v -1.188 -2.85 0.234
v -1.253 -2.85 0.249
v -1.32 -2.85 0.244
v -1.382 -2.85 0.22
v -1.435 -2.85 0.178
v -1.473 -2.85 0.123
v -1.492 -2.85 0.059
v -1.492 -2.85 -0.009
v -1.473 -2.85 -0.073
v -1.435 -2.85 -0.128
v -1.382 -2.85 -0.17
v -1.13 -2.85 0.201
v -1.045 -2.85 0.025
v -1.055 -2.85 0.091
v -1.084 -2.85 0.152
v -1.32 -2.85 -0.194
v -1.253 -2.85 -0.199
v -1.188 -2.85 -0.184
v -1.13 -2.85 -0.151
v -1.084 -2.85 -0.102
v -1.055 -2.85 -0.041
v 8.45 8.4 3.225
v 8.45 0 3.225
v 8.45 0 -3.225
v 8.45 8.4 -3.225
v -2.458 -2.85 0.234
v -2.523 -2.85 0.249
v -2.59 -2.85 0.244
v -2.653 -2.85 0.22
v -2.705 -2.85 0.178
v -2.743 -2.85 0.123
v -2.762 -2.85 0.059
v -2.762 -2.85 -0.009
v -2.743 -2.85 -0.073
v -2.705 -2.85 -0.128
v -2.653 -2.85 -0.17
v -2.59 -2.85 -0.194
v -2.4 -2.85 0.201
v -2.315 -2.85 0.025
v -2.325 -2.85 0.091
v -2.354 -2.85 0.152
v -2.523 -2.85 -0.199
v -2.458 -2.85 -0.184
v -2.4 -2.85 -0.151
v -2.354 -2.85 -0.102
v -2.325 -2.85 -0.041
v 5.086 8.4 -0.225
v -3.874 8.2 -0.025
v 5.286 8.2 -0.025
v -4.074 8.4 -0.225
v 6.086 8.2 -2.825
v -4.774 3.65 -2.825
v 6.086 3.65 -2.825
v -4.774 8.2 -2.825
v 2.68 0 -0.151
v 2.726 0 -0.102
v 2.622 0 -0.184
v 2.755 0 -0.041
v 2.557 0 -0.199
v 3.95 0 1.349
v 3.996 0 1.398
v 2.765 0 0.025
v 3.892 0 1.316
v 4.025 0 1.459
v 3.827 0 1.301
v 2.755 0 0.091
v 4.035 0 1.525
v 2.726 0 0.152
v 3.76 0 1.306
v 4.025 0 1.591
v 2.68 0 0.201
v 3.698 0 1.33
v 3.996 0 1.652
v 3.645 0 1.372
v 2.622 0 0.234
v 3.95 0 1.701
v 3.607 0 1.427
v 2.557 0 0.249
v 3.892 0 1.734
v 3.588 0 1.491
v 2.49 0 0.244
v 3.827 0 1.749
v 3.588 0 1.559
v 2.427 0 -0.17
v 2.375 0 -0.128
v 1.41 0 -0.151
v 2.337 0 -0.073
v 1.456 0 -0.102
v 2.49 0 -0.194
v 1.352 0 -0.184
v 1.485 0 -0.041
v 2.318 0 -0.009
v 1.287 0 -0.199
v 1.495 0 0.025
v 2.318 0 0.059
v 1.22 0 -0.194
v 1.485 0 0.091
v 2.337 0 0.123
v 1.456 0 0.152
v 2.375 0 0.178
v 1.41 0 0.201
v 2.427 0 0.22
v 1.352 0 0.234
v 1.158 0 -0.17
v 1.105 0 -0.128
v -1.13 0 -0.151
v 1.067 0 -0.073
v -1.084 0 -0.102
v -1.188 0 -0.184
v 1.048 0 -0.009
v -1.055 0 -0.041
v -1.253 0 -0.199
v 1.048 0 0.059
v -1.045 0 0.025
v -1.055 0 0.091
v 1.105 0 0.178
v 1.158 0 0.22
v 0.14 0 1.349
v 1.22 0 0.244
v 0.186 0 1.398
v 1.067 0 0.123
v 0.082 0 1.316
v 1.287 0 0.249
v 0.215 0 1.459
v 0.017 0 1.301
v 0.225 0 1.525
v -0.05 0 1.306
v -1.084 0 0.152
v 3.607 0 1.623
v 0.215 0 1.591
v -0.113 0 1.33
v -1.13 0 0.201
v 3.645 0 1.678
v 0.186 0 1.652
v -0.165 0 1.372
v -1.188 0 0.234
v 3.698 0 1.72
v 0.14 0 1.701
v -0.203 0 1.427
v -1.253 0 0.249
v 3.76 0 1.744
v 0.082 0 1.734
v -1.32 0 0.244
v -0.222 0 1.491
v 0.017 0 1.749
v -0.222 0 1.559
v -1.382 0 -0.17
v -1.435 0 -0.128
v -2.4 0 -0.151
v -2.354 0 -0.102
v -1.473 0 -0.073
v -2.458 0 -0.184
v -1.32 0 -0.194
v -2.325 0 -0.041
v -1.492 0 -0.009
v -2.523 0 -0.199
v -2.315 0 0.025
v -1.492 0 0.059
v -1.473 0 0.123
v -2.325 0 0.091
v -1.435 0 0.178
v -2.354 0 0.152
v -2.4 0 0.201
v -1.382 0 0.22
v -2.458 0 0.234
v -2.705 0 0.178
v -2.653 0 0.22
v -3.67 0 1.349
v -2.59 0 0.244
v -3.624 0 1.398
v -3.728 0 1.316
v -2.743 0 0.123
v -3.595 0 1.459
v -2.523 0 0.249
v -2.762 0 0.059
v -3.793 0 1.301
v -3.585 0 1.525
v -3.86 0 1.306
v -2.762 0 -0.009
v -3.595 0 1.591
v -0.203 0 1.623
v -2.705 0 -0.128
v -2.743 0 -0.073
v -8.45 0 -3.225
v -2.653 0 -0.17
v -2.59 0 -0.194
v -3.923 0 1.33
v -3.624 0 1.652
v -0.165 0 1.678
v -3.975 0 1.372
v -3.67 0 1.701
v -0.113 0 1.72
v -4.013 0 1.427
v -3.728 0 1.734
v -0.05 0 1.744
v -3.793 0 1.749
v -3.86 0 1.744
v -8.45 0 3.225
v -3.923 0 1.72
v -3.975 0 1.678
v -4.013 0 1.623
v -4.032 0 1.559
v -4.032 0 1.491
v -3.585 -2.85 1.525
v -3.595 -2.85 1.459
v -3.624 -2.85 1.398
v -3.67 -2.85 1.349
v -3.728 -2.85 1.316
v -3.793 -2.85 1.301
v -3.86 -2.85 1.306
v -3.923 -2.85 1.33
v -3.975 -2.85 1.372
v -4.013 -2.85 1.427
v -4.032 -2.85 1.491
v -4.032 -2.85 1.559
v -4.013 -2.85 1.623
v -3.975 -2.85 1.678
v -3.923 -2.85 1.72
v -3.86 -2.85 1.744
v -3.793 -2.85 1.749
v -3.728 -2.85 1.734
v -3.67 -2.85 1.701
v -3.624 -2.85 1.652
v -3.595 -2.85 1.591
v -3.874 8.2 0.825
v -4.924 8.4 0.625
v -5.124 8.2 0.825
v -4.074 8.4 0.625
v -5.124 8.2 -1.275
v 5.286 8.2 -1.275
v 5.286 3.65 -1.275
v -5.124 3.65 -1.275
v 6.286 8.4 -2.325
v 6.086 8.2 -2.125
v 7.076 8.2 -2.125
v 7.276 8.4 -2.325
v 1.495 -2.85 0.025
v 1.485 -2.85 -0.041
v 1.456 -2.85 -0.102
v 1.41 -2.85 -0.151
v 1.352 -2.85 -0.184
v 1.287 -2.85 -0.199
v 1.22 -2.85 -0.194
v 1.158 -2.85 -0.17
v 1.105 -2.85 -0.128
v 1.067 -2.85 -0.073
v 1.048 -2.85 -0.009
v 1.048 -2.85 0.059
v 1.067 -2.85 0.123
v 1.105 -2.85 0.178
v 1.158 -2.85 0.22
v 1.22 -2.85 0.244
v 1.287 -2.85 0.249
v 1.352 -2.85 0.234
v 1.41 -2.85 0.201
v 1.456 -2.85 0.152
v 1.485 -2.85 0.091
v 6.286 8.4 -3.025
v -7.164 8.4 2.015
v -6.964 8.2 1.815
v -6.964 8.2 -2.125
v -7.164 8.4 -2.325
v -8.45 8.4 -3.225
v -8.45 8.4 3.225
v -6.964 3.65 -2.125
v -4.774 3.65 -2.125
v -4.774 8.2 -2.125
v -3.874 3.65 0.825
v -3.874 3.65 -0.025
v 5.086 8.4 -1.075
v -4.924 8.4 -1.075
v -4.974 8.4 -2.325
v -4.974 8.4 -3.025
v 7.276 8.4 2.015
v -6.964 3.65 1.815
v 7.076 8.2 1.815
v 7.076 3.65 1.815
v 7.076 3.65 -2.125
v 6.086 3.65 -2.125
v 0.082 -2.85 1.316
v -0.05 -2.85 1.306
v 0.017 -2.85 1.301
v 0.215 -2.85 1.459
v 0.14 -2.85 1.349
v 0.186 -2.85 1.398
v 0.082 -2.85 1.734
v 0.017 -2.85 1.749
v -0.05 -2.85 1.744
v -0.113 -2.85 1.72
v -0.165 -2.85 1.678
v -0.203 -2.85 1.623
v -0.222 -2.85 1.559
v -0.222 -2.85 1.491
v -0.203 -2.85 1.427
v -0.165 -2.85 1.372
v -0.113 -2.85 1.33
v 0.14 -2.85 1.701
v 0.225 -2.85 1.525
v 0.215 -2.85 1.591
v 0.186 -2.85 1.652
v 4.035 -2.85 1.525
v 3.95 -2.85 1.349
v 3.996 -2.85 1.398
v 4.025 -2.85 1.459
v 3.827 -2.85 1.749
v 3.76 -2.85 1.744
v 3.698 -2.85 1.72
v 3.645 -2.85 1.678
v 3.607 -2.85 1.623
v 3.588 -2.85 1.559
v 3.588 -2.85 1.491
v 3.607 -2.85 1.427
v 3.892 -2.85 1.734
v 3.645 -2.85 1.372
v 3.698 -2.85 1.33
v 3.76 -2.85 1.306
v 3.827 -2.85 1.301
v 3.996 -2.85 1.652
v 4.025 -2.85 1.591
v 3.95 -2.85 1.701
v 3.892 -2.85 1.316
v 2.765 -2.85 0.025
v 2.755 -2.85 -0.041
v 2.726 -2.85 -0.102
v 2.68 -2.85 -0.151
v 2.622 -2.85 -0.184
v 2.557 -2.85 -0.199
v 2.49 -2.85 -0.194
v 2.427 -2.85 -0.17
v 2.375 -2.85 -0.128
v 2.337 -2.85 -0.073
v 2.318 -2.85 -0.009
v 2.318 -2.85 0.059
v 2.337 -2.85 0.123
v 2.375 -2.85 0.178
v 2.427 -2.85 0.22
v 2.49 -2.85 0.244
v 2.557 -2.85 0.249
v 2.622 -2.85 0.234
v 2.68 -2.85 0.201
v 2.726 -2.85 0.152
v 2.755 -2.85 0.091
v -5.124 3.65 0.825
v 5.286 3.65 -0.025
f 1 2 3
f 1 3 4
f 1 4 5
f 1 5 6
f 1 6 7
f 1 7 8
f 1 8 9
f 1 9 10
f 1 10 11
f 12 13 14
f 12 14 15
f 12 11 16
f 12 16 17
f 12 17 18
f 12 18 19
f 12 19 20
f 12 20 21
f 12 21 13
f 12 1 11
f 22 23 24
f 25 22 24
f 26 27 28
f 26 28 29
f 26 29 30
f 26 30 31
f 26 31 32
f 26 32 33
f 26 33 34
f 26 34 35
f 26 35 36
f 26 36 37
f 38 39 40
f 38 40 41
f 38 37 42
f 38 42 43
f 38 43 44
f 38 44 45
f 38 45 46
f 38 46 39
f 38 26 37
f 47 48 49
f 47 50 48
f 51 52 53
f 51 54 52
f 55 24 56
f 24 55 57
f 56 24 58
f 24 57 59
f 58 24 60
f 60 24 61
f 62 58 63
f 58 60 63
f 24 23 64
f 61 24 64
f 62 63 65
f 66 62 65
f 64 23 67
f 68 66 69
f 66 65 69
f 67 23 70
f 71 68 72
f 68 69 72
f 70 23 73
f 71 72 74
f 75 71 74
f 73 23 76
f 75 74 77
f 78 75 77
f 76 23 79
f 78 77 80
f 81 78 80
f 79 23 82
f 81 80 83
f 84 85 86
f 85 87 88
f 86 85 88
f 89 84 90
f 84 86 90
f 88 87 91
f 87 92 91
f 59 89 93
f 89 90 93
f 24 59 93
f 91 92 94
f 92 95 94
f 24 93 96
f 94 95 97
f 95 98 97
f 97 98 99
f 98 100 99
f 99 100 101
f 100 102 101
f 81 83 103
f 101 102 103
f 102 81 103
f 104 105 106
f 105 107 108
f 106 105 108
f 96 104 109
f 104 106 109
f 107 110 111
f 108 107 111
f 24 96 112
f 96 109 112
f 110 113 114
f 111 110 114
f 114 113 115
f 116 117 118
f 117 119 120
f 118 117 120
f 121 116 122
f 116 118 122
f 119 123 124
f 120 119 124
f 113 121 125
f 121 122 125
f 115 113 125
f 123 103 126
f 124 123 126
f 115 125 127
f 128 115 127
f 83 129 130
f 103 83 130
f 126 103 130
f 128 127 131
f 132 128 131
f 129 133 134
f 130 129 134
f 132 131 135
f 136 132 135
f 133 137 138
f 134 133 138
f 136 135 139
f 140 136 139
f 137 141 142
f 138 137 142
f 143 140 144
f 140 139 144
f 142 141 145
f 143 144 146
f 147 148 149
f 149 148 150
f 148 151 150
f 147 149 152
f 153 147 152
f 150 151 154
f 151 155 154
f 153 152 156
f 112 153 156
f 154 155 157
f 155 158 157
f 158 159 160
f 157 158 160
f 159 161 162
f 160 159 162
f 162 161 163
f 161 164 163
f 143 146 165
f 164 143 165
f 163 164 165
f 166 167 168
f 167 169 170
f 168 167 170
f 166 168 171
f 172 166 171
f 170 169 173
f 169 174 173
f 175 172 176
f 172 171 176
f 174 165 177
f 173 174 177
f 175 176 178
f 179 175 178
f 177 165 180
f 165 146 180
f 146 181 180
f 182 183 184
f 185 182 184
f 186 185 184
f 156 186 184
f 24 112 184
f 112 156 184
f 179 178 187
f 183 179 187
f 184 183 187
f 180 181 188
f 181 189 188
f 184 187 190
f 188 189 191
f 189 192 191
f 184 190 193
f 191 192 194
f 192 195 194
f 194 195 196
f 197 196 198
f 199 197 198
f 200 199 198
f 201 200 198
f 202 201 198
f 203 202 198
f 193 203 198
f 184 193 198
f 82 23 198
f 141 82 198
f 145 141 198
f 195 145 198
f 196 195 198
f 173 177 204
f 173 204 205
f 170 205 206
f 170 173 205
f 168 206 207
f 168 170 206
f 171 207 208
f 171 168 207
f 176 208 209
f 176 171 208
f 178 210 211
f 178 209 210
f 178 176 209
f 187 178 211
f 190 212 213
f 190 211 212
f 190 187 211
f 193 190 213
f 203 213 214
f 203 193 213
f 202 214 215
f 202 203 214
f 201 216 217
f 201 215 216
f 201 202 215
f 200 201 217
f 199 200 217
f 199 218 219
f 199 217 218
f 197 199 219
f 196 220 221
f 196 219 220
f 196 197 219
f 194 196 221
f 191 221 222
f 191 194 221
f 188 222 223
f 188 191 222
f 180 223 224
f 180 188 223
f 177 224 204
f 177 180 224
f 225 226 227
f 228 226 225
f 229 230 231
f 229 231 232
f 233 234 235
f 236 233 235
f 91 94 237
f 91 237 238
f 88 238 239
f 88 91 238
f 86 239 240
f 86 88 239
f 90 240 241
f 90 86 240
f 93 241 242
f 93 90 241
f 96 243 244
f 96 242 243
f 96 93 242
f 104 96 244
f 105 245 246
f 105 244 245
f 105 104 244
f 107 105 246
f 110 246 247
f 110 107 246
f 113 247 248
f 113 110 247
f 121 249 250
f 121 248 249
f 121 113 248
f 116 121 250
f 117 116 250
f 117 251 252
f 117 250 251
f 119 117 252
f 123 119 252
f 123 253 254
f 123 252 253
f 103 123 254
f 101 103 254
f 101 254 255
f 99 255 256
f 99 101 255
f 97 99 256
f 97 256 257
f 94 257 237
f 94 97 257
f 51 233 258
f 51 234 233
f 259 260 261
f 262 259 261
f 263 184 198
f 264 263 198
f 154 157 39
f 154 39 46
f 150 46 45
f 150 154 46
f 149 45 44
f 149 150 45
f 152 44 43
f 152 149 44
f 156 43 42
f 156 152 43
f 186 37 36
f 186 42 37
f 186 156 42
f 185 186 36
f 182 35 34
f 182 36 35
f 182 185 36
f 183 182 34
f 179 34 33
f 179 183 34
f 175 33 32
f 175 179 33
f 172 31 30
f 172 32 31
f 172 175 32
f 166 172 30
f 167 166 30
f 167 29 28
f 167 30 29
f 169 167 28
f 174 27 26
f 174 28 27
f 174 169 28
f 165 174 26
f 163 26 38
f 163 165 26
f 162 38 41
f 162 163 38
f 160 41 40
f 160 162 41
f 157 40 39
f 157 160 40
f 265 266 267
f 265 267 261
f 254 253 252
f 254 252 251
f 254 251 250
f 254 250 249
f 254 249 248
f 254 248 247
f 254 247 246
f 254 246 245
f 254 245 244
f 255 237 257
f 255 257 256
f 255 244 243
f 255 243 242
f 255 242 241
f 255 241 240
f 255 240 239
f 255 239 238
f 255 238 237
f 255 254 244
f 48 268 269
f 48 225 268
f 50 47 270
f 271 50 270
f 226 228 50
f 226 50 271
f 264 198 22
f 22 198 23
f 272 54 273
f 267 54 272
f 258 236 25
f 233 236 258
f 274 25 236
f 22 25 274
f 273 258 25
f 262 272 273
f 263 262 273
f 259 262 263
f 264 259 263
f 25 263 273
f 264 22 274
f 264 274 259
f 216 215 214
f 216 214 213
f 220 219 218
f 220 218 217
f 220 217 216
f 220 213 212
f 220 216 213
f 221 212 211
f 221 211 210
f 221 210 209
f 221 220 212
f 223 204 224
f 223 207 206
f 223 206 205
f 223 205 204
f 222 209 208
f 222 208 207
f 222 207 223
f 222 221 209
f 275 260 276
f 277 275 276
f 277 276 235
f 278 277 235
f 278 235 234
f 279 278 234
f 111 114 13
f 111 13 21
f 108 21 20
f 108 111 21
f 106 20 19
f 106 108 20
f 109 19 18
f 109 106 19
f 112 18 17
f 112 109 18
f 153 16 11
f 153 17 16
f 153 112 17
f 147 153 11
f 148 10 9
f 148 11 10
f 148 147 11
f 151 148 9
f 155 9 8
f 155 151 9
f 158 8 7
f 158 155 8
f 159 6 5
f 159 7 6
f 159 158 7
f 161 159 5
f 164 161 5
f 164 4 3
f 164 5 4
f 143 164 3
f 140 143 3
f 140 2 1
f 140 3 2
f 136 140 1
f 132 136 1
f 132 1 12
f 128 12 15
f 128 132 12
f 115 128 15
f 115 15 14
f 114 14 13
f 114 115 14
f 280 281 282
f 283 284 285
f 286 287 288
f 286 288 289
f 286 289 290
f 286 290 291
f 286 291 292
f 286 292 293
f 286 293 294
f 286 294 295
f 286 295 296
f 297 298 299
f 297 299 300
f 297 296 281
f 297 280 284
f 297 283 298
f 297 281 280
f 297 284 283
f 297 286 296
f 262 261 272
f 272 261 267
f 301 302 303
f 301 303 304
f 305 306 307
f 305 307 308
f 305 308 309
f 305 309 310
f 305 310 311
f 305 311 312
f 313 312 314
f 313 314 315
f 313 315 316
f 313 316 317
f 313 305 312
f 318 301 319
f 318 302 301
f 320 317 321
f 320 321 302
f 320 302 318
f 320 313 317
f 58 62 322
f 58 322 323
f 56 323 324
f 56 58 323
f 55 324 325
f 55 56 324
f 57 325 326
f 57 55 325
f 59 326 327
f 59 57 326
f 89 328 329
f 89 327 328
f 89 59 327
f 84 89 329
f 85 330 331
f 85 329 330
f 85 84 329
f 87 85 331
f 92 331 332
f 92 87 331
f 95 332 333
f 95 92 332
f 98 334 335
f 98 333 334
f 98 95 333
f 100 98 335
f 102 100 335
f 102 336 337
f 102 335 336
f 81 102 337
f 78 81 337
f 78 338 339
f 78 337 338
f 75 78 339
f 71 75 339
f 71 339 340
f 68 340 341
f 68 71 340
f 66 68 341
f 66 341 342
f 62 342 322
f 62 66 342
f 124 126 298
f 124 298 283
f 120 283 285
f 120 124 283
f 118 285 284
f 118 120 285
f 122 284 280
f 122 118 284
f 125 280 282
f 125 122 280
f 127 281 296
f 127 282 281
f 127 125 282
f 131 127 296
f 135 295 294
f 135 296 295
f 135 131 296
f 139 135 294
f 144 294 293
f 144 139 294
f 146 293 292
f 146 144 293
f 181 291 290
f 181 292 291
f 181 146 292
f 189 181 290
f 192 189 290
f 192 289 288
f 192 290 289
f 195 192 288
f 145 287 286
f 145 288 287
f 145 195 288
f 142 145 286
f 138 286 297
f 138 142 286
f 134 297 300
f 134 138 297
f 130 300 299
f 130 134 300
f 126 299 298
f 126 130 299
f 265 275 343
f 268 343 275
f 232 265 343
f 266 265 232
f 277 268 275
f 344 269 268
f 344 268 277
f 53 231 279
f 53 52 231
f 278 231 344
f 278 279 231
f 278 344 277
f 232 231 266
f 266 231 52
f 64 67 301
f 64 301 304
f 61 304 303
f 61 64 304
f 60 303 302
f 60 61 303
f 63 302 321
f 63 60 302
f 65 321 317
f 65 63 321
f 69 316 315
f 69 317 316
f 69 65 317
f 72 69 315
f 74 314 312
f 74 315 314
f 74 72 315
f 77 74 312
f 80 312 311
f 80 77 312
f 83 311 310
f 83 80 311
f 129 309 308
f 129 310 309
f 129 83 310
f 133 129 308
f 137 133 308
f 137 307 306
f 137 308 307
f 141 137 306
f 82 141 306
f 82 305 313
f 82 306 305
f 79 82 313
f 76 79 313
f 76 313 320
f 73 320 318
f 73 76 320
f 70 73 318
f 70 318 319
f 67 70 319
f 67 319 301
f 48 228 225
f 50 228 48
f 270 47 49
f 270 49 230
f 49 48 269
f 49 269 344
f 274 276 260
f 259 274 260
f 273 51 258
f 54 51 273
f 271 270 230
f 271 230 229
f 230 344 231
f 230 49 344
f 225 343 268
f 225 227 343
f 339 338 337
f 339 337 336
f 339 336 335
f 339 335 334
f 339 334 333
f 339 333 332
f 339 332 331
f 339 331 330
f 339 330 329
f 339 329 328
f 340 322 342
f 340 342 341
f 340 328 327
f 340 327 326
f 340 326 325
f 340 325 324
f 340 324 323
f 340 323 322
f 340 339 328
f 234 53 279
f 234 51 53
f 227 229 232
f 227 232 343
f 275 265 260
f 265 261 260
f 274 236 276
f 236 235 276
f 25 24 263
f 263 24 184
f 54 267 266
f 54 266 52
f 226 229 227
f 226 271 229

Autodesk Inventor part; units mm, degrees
ref_plane "YZ Plane" through (0, 0, 0) normal (1, 0, 0) x (0, 1, 0)
ref_plane "XZ Plane" through (0, 0, 0) normal (0, 1, 0) x (-1, 0, 0)
ref_plane "XY Plane" through (0, 0, 0) normal (0, 0, 1) x (1, 0, 0)
sketch "Sketch1" plane through (0, 0, 0) normal (0, 1, 0) x (-1, 0, 0)
  line L0 (8.45, 3.225) -> (-8.45, 3.225)
  line L1 (-8.45, 3.225) -> (-8.45, -3.225)
  line L2 (-8.45, -3.225) -> (8.45, -3.225)
  line L3 (8.45, -3.225) -> (8.45, 3.225)
  point P0 (0, 0)
  dimension "d0" = 16.9
  dimension "d1" = 8.45
  dimension "d2" = 6.45
  dimension "d3" = 3.225
extrude "Extrusion1" add sketch "Sketch1" along normal blind 8.4
sketch "Sketch2" plane through (0, 8.4, 0) normal (0, 1, 0) x (1, 0, 0)
  line L0 (-6.9642, -1.815) -> (7.0758, -1.815)
  line L1 (7.0758, -1.815) -> (7.0758, 2.125)
  line L2 (7.0758, 2.125) -> (-6.9642, 2.125)
  line L3 (-6.9642, 2.125) -> (-6.9642, -1.815)
  line L4 (6.0858, 2.125) -> (-4.7742, 2.125)
  line L5 (-4.7742, 2.125) -> (-4.7742, 2.825)
  line L6 (-4.7742, 2.825) -> (6.0858, 2.825)
  line L7 (6.0858, 2.825) -> (6.0858, 2.125)
  line L8 (-5.1242, -0.825) -> (-3.8742, -0.825)
  line L9 (-3.8742, -0.825) -> (-3.8742, 0.025)
  line L10 (-3.8742, 0.025) -> (5.2858, 0.025)
  line L11 (5.2858, 0.025) -> (5.2858, 1.275)
  line L12 (5.2858, 1.275) -> (-5.1242, 1.275)
  line L13 (-5.1242, 1.275) -> (-5.1242, -0.825)
  line L14 (-8.45, -3.225) -> (8.45, -3.225) projected
  point P0 (0, 0)
  dimension "d6" = 10.86
  dimension "d7" = 4.5
  dimension "d8" = 1.84
  dimension "d9" = 1.79
  dimension "d10" = 0.8
  dimension "d11" = 10.41
  dimension "d12" = 3.94
  dimension "d13" = 1.55
  dimension "d14" = 1.25
  dimension "d15" = 0.85
  dimension "d16" = 0.85
  dimension "d17" = 1.25
extrude "Extrusion2" cut sketch "Sketch2" against normal blind 4.75
chamfer "Chamfer1" distance 0.2 angle 45 14 edges at (0.0808, 8.4, -1.275) (5.2858, 8.4, -0.65) (0.7058, 8.4, -0.025) (-3.8742, 8.4, 0.4) (-4.4992, 8.4, 0.825) (-5.1242, 8.4, -0.225) (-4.7742, 8.4, -2.475) (-5.8692, 8.4, -2.125) (-6.9642, 8.4, -0.155) (0.0558, 8.4, 1.815) (7.0758, 8.4, -0.155) (6.5808, 8.4, -2.125) (6.0858, 8.4, -2.475) (0.6558, 8.4, -2.825)
sketch "Sketch3" plane through (0, 0, 0) normal (0, -1, 0) x (1, 0, 0)
  line L0 (31.8884, 0.025) -> (-22.6507, 0.025) construction
  line L1 (42.8322, 1.525) -> (-5.5903, 1.525) construction
  circle A0 centre (0, 1.525) radius 0.225
  circle A1 centre (3.81, 1.525) radius 0.225
  circle A2 centre (-3.81, 1.525) radius 0.225
  circle A3 centre (-1.27, 0.025) radius 0.225
  circle A4 centre (-2.54, 0.025) radius 0.225
  circle A5 centre (1.27, 0.025) radius 0.225
  circle A6 centre (2.54, 0.025) radius 0.225
  line L2 (-4.9242, -1.075) -> (5.0858, -1.075) projected
  line L3 (4.5428, -1.075) -> (-4.5914, -1.075)
  point P0 (0, 0)
  dimension "d23" = 1.27
  dimension "d24" = 1.27
  dimension "d25" = 1.27
  dimension "d26" = 1.27
  dimension "d27" = 1.27
  dimension "d28" = 0
  dimension "d29" = 1.27
  dimension "d30" = 1.5
  dimension "d31" = 0.45
  dimension "d32" = 0.45
  dimension "d33" = 0.45
  dimension "d34" = 0.45
  dimension "d35" = 0.45
  dimension "d36" = 0.45
  dimension "d37" = 0.45
  dimension "d38" = 1.1
extrude "Extrusion3" add sketch "Sketch3" along normal blind 2.85
properties part number "SATA_Conn_TH"
